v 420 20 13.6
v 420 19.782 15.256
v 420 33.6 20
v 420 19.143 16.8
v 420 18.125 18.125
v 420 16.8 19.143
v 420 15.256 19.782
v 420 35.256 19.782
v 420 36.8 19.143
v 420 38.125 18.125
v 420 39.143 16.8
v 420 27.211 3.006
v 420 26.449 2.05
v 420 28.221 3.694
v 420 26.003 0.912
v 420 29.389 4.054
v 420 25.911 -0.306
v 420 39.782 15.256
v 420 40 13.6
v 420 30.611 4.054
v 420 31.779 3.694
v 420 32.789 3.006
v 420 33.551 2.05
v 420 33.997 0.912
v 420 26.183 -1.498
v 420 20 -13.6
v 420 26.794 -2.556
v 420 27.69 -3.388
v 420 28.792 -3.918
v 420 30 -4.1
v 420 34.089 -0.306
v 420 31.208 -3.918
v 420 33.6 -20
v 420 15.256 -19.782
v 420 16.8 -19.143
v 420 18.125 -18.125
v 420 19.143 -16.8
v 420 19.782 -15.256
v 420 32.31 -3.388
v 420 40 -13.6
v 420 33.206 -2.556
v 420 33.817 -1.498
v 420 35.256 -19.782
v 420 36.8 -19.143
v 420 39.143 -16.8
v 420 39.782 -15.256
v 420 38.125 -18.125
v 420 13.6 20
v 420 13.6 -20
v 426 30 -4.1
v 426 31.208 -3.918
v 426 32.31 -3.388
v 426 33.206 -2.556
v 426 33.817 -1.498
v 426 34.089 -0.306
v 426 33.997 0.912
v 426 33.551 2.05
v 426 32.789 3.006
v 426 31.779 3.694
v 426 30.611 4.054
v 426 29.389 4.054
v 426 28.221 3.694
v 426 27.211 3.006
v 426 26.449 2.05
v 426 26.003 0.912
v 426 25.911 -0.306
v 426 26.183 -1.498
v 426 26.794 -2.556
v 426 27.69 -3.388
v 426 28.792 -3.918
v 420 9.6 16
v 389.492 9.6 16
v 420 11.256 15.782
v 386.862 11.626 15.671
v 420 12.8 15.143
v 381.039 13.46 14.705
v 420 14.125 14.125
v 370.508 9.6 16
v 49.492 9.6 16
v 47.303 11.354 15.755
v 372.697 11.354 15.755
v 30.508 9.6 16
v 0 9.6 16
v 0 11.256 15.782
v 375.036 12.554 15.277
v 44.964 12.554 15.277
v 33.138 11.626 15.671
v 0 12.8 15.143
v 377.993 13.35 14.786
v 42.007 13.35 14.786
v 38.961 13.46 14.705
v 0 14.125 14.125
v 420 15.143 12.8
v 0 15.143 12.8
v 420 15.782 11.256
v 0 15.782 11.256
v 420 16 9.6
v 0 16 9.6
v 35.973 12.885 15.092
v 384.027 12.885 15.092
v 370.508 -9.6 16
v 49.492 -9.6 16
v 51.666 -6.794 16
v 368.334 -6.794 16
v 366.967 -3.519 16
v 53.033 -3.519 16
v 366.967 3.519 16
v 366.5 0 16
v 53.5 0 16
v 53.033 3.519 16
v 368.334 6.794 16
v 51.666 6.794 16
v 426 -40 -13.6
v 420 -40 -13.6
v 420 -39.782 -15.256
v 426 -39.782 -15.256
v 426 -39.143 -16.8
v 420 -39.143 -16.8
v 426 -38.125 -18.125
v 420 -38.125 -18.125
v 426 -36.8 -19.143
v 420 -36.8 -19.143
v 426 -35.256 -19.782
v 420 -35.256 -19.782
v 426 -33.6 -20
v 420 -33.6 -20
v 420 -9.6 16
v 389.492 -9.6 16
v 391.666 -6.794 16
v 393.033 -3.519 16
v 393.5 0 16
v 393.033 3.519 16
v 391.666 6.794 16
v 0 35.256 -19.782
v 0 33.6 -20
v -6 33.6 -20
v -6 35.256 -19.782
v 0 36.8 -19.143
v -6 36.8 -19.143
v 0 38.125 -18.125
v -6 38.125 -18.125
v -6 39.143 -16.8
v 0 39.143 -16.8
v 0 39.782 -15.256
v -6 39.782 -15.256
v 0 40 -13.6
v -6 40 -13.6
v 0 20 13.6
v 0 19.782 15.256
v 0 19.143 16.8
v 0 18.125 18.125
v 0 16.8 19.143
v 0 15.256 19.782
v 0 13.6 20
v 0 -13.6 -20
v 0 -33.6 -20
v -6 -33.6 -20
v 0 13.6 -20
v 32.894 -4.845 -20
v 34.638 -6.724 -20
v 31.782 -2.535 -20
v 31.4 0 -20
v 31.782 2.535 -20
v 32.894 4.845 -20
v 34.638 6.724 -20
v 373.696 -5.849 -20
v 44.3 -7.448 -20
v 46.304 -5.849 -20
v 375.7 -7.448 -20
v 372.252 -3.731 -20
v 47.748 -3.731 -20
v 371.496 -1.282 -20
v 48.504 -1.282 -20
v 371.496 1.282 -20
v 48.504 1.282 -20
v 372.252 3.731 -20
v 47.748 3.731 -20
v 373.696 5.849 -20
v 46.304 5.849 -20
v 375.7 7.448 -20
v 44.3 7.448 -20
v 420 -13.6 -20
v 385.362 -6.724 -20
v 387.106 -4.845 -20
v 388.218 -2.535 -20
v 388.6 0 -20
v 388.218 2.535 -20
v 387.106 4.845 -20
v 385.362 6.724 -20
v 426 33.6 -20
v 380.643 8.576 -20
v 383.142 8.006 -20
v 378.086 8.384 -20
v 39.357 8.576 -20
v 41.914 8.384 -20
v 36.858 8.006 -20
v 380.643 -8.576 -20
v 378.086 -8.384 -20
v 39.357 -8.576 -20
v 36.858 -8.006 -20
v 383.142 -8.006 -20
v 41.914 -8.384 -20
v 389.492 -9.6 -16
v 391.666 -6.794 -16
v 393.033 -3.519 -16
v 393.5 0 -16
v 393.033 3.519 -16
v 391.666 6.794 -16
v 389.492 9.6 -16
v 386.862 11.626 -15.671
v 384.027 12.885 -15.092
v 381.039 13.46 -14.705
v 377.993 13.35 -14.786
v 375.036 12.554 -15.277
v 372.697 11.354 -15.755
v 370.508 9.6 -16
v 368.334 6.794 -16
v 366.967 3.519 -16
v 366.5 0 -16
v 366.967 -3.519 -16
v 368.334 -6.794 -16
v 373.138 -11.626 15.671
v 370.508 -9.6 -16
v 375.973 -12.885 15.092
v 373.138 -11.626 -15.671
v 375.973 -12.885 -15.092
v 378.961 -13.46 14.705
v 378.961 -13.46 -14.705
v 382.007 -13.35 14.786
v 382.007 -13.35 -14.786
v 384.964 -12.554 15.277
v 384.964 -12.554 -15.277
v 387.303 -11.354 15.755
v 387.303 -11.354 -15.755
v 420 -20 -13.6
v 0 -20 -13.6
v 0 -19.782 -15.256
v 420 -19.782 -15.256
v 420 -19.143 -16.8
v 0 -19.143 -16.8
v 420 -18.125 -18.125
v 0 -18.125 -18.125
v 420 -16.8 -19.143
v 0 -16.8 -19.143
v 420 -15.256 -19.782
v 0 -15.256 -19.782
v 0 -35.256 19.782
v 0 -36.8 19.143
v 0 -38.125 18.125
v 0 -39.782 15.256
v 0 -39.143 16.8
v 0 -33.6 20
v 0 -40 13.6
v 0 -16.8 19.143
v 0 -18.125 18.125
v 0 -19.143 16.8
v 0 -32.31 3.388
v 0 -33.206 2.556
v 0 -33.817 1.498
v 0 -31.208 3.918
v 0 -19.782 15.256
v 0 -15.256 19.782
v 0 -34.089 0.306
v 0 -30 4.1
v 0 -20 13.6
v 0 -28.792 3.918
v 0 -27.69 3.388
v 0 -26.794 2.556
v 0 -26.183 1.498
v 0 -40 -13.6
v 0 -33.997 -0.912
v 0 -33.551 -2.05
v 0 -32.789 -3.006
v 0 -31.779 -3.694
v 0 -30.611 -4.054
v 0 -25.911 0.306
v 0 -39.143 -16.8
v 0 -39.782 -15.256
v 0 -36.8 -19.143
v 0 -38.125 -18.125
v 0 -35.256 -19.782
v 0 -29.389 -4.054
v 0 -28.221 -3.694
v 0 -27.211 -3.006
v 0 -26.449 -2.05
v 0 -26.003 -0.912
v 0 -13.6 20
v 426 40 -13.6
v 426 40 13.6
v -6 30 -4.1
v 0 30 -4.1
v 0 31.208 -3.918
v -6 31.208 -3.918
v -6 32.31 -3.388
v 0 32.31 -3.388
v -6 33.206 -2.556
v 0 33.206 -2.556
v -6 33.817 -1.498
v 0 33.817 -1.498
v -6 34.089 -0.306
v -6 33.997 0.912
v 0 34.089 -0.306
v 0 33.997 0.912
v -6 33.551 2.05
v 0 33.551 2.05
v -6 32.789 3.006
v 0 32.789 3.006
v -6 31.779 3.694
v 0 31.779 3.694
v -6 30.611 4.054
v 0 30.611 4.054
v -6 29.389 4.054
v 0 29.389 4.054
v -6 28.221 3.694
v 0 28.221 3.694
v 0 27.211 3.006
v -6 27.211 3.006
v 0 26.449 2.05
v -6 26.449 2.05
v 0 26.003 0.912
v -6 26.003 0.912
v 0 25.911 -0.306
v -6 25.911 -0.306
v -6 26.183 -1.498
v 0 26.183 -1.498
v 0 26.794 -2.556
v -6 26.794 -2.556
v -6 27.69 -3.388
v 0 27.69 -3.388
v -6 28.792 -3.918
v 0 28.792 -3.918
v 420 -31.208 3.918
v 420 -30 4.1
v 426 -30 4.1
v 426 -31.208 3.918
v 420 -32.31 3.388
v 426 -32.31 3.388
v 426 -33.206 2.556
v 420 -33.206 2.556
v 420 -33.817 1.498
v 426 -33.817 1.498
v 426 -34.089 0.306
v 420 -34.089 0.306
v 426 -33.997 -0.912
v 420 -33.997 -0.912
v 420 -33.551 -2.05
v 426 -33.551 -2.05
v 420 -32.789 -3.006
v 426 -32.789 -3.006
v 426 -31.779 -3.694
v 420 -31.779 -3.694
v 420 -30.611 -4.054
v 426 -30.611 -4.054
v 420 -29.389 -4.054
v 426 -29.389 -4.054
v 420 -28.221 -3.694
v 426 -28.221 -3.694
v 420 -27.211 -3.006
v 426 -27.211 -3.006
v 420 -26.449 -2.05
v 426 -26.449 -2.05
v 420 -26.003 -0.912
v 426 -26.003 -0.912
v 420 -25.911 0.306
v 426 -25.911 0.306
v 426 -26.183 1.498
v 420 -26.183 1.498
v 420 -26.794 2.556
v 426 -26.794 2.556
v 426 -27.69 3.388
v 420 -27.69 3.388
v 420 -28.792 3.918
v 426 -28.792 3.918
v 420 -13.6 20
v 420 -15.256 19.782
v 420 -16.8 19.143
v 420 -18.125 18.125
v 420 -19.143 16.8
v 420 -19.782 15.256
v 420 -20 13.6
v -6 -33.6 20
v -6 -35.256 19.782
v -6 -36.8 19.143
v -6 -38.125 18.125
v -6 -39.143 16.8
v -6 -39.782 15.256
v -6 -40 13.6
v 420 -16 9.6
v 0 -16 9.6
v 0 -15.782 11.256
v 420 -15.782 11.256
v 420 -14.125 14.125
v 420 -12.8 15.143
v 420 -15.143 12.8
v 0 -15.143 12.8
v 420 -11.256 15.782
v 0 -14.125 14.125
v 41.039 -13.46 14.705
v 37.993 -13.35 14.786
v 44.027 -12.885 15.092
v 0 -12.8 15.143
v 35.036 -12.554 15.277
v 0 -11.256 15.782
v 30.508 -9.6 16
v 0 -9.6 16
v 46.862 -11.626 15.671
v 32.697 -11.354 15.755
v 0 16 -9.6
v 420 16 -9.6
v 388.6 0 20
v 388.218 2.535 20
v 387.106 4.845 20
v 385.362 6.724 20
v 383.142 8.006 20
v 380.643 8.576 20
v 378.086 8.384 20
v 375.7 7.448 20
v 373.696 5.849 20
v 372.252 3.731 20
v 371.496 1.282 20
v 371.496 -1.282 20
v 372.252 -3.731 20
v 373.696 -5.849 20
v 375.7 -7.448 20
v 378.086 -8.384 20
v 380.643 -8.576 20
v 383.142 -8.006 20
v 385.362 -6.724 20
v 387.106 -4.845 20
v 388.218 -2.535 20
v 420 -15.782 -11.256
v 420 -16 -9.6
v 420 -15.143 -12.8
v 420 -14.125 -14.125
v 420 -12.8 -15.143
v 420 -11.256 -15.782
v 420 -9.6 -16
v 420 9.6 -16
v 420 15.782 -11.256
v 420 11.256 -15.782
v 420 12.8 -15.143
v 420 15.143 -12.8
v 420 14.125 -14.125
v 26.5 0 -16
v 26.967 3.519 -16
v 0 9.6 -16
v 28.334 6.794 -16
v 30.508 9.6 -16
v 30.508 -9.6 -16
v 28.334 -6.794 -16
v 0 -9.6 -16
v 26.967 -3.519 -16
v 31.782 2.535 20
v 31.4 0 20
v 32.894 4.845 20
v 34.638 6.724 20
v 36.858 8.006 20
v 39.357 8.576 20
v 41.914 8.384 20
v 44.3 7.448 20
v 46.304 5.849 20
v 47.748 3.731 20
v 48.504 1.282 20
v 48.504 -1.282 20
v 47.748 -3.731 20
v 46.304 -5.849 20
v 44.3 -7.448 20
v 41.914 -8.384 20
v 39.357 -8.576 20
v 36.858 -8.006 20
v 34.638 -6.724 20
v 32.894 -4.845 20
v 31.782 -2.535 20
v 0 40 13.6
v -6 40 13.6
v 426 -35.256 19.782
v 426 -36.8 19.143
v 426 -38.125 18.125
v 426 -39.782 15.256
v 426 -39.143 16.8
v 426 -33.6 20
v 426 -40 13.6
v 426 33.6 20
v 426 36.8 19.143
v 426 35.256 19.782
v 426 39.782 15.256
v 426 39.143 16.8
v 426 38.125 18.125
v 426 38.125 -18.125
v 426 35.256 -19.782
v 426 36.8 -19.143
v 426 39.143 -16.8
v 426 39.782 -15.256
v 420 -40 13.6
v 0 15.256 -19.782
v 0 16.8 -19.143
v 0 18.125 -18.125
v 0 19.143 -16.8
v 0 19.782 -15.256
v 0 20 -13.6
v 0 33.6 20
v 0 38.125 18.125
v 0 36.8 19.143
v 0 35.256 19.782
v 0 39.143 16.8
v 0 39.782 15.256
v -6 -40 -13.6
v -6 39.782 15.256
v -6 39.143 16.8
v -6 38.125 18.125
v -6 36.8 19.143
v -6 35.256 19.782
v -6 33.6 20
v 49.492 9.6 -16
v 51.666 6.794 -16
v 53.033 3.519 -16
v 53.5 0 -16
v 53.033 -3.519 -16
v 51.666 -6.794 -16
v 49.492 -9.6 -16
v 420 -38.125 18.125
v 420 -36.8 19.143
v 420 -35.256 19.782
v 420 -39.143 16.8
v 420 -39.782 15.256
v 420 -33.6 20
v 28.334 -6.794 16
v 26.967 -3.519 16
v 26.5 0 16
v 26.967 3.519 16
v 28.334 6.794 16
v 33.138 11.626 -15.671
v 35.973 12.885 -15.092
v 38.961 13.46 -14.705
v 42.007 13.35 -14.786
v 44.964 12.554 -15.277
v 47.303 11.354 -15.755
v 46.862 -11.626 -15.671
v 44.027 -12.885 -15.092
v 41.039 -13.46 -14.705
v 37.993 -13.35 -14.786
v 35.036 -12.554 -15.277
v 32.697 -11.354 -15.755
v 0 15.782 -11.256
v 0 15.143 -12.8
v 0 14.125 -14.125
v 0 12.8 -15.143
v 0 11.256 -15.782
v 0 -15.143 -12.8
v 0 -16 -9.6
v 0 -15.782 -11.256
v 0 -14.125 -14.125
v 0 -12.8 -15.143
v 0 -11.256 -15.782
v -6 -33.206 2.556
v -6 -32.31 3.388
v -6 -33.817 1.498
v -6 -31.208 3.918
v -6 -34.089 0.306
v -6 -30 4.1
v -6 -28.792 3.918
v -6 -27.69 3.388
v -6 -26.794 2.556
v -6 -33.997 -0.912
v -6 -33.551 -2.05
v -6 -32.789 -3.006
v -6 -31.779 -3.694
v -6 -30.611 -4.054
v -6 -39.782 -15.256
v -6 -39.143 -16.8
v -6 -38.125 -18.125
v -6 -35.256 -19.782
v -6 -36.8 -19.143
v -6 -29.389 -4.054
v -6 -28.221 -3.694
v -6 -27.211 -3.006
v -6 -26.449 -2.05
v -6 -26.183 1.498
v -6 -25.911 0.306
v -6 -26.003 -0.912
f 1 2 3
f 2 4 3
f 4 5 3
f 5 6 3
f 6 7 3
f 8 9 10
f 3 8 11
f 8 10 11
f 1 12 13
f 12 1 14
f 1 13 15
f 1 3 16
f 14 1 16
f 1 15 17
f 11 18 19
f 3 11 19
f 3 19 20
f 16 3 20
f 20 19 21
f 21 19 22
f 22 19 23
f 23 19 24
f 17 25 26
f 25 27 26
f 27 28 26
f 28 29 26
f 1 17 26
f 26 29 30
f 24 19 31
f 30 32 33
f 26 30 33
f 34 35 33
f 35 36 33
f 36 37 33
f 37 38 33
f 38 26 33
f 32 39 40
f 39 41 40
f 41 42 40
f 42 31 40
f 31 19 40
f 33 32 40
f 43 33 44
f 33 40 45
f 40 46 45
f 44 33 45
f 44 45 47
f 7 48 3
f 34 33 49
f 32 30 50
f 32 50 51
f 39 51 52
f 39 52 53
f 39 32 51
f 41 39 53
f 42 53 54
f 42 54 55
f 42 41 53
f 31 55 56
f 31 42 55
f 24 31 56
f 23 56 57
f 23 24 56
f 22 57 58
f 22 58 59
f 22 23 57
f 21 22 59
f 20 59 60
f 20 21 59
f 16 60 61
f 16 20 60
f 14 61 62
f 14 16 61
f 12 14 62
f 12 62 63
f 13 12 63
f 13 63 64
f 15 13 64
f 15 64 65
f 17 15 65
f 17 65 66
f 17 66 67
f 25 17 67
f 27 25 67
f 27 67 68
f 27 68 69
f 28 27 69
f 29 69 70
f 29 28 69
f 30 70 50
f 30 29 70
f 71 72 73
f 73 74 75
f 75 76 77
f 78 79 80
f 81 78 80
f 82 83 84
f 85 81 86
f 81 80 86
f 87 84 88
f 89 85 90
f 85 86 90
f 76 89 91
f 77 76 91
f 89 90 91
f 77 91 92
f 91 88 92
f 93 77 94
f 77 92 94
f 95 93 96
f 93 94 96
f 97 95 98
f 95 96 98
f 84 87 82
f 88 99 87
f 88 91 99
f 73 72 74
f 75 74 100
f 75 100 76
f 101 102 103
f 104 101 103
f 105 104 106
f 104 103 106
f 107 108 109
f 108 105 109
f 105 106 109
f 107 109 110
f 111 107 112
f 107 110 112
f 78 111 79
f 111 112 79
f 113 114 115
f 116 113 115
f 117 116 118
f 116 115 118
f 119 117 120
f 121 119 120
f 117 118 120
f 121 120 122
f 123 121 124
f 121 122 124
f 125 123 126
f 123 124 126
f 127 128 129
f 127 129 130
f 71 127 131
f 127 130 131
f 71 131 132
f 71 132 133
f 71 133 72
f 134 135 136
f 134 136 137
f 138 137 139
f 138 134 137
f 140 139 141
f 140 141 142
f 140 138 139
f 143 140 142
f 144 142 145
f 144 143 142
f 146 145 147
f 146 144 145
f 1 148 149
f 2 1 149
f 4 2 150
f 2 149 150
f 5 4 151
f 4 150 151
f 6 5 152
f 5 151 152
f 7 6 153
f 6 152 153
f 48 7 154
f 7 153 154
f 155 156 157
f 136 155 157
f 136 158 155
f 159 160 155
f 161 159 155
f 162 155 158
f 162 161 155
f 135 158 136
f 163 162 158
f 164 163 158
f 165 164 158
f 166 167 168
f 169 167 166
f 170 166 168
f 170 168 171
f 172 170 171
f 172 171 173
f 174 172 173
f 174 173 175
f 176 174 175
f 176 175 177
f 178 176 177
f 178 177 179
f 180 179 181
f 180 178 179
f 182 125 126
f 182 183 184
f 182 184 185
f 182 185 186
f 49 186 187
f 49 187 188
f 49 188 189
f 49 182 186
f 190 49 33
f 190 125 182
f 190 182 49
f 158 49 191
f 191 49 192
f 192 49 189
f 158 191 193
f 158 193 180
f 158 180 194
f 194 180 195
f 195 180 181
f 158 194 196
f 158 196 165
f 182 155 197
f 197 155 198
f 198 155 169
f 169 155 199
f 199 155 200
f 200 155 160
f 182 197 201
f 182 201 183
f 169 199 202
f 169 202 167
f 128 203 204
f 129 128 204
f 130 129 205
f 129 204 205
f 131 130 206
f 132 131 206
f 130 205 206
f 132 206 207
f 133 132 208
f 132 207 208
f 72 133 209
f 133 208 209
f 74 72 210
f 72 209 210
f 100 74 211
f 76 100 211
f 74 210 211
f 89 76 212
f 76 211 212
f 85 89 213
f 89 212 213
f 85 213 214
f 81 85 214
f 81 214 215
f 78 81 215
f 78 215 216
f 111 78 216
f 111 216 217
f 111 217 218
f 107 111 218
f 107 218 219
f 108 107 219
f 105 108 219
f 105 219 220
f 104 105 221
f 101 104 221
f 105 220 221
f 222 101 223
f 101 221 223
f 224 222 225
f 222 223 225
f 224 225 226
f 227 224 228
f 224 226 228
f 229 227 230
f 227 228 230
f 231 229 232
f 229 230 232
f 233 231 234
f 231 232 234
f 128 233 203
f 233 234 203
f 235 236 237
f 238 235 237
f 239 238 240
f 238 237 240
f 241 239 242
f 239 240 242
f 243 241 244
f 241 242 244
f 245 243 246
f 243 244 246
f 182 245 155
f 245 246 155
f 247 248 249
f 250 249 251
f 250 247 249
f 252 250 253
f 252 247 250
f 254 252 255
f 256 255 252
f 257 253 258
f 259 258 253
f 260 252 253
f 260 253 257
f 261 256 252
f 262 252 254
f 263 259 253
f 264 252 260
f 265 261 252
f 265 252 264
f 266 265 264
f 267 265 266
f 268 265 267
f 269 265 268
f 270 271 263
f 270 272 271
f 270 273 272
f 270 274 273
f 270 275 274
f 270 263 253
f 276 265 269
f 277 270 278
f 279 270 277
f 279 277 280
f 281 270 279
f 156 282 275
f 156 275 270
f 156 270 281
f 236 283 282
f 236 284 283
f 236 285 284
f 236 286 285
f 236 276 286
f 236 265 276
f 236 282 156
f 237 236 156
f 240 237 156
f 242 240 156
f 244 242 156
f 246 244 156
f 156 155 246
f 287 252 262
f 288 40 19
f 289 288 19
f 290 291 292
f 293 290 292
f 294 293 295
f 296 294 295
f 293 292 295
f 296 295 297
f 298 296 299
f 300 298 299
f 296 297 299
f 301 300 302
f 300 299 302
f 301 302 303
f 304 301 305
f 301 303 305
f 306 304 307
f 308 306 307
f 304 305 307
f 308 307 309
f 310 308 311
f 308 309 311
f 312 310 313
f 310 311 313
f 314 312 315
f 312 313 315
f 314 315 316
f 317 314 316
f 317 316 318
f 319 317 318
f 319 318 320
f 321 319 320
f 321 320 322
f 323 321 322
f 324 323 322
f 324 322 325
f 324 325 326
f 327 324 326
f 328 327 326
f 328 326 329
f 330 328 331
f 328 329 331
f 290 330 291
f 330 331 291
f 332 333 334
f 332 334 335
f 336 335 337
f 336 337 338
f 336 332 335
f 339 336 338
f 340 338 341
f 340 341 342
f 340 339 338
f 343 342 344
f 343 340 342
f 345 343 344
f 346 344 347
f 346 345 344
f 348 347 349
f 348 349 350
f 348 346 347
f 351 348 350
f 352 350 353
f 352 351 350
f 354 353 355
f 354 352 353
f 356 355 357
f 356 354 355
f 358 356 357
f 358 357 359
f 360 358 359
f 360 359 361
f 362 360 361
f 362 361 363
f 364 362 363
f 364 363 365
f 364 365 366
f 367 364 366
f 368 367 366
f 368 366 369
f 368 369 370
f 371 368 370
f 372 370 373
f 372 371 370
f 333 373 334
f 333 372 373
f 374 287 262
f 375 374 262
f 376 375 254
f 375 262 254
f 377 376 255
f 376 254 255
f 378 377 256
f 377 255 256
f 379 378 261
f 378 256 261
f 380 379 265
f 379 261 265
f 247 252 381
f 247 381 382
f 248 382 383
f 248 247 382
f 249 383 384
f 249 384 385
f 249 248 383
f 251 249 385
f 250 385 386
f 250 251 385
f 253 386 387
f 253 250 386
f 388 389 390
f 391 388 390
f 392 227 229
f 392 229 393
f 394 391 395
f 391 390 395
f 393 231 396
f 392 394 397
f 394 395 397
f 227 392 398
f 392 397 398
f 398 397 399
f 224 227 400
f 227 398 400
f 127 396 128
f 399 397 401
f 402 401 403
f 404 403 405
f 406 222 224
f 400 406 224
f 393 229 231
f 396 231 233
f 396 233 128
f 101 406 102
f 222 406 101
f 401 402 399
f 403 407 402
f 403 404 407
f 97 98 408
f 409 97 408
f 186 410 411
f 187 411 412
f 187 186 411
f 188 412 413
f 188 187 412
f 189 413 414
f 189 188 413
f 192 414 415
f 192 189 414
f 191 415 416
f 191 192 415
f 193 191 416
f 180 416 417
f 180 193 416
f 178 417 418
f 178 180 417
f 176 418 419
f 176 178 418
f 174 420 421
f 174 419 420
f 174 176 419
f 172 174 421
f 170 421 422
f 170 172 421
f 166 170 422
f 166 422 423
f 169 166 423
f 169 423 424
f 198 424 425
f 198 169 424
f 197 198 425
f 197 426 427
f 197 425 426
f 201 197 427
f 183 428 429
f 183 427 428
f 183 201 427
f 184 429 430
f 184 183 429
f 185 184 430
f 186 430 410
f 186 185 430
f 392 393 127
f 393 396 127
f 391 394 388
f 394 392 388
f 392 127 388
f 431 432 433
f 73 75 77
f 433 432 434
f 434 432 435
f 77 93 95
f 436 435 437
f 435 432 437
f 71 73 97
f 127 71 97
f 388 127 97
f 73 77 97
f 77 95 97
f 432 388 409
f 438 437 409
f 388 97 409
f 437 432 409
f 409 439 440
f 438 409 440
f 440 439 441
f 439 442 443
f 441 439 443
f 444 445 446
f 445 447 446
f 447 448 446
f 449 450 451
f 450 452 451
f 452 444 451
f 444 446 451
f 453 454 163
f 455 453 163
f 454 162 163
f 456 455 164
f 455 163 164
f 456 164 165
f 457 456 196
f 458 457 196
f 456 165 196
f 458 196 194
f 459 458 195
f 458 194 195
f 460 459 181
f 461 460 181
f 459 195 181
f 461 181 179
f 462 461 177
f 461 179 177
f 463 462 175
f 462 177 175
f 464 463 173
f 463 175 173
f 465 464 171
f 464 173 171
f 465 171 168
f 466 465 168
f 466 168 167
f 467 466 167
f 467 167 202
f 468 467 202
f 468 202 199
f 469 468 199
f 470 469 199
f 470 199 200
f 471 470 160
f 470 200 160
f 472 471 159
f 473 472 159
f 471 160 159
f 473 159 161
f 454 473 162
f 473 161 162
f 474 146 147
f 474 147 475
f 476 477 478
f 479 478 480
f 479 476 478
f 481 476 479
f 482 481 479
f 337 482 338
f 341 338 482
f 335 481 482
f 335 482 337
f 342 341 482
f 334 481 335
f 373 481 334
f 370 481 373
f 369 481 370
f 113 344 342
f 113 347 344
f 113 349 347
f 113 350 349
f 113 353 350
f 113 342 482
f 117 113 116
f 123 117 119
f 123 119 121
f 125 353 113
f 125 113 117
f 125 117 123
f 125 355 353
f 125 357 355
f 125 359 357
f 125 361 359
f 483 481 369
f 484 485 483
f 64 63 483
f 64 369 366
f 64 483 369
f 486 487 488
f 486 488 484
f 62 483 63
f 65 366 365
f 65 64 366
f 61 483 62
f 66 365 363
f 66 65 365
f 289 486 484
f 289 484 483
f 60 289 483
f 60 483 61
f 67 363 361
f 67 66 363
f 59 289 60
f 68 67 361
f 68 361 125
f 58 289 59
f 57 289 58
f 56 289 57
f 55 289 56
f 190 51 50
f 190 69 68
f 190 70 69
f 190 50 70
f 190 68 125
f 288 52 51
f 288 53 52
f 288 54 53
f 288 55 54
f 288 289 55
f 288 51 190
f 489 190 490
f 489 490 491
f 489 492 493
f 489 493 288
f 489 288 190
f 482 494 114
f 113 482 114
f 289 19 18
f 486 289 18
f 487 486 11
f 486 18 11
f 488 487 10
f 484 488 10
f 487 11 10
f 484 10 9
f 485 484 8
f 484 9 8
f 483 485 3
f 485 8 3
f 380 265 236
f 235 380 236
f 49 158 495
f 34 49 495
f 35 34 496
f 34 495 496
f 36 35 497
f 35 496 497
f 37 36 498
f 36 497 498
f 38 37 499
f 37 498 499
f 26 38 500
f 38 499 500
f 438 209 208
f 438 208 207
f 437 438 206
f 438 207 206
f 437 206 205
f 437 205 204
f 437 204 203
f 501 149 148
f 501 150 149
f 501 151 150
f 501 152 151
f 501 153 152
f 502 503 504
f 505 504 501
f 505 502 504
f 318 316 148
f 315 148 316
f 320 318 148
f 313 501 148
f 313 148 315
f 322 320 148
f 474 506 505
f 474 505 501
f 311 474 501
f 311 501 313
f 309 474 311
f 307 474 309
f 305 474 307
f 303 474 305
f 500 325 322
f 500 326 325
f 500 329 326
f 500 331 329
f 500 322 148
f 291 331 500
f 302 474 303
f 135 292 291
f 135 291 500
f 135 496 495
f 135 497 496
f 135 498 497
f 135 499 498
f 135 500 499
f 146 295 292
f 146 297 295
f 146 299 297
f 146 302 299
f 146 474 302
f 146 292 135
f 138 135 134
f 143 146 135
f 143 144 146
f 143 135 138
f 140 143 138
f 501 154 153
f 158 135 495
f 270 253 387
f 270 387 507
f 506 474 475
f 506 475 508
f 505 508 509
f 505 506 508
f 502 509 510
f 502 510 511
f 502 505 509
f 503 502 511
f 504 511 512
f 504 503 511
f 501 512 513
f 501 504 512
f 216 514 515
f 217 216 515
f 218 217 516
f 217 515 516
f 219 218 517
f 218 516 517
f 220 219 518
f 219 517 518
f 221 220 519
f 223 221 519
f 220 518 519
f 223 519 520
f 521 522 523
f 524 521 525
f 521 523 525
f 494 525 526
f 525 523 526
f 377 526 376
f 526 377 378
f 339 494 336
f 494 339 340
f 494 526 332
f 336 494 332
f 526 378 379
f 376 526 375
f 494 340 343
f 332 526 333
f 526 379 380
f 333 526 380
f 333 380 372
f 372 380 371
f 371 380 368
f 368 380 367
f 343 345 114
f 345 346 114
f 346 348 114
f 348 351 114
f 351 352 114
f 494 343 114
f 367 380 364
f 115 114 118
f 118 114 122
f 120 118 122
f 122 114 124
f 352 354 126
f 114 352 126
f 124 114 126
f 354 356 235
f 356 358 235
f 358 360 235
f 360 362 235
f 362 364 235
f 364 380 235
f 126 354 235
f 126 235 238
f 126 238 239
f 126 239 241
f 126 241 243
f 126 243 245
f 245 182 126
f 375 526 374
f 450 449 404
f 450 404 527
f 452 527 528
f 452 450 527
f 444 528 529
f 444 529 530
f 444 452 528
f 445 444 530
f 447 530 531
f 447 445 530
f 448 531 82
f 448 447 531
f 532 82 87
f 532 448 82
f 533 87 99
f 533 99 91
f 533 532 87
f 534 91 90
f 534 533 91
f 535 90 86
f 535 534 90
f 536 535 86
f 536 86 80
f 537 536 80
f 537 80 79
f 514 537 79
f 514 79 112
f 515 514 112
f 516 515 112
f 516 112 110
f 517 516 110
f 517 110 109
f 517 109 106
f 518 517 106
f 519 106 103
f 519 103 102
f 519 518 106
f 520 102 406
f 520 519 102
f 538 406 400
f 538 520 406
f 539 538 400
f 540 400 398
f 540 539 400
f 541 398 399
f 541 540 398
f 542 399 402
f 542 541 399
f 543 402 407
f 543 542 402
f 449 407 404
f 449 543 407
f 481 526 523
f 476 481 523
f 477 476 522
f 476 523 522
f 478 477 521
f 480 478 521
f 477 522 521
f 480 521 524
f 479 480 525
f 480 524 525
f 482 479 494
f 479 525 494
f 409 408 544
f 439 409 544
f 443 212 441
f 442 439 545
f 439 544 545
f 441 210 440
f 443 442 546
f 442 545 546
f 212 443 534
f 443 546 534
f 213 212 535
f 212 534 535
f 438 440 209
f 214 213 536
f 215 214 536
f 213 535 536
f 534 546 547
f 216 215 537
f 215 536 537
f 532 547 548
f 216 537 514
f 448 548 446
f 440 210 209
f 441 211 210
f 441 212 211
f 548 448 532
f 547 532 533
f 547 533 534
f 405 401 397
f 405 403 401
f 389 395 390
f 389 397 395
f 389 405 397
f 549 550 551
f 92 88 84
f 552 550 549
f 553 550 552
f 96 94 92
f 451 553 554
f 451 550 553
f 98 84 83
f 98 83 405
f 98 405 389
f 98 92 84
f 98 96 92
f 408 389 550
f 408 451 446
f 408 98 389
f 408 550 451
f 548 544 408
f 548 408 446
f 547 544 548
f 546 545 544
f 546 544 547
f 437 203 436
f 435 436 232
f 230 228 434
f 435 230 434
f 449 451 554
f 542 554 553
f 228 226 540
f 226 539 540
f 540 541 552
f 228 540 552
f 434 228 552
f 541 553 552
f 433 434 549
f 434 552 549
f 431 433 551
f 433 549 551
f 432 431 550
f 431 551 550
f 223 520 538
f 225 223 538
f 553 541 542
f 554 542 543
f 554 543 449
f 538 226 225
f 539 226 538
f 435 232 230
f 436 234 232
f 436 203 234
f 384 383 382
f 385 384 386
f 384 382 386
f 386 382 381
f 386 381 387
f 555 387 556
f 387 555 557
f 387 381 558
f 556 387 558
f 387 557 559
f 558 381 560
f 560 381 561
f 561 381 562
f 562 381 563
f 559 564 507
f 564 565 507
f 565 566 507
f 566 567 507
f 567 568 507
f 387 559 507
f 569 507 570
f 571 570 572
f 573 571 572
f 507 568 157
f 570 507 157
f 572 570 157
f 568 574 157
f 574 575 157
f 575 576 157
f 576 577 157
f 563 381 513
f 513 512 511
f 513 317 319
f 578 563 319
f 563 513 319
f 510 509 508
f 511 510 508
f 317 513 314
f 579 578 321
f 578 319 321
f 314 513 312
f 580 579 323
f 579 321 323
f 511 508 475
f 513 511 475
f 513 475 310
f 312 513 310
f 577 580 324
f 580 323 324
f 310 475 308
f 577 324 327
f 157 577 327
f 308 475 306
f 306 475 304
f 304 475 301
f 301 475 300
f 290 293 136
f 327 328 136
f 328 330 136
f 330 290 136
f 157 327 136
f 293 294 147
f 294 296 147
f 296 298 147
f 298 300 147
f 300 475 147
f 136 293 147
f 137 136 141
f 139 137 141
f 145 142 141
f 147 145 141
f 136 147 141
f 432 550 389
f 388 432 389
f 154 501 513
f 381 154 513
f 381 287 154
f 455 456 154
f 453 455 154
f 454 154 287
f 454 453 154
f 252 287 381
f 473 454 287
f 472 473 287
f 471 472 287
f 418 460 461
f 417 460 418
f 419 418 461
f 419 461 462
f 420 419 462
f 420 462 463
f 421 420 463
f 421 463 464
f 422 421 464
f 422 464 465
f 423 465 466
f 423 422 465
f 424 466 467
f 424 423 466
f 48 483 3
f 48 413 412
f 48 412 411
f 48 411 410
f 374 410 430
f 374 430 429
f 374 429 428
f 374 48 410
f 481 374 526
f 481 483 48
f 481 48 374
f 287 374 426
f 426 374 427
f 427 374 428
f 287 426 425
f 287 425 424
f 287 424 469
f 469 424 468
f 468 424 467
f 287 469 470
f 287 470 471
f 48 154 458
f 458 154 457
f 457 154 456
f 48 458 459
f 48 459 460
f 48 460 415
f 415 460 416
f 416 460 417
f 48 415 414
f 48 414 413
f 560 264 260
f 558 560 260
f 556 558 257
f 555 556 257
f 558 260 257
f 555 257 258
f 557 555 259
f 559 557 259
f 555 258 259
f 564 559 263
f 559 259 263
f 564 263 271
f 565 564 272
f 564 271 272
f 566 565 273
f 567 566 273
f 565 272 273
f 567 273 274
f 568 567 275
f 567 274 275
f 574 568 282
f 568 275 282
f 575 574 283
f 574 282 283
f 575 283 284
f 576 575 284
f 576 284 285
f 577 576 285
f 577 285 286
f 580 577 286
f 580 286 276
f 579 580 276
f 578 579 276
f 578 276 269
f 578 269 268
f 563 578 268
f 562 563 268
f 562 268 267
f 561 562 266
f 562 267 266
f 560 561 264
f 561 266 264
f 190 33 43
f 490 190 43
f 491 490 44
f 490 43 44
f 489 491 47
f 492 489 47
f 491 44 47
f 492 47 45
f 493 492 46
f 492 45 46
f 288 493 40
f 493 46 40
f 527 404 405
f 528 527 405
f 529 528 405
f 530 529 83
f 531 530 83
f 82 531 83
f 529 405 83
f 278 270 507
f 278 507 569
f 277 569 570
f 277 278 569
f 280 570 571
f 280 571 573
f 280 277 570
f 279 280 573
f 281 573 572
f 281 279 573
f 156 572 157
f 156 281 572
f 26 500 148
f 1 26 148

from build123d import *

# Parameters (mm, degrees)
DODANIE_WYCI_GNI_CIE2_DEPTH = 420
SZKIC4_R                    = 4.1
DODANIE_WYCI_GNI_CIE3_DEPTH = 6
SZKIC6_R                    = 8.6
WYTNIJ_WYCI_GNI_CIE1_DEPTH  = 430.73945595
DODANIE_WYCI_GNI_CIE5_REACH = 431.739
SZKIC6_3_R                  = 13.5
SZKIC6_3_R_2                = 8.6


with BuildPart() as part:
    # Szkic3 → Dodanie-wyciągnięcie2 (new body)
    with BuildSketch(Plane(origin=(0, 0, 0), x_dir=(0, 0, -1), z_dir=(1, 0, 0))):
        with BuildLine():
            Line((-13.6, -20), (13.6, -20))
            ThreePointArc((13.6, -20), (18.1254834, -18.1254834), (20, -13.6))
            Line((20, -13.6), (20, 13.6))
            ThreePointArc((20, 13.6), (18.1254834, 18.1254834), (13.6, 20))
            Line((13.6, 20), (-13.6, 20))
            ThreePointArc((-13.6, 20), (-18.1254834, 18.1254834), (-20, 13.6))
            Line((-20, 13.6), (-20, -13.6))
            ThreePointArc((-20, -13.6), (-18.1254834, -18.1254834), (-13.6, -20))
        make_face()
        with BuildLine():
            Line((-9.6, 16), (9.6, 16))
            ThreePointArc((9.6, 16), (14.1254834, 14.1254834), (16, 9.6))
            Line((16, 9.6), (16, -9.6))
            ThreePointArc((16, -9.6), (14.1254834, -14.1254834), (9.6, -16))
            Line((9.6, -16), (-9.6, -16))
            ThreePointArc((-9.6, -16), (-14.1254834, -14.1254834), (-16, -9.6))
            Line((-16, -9.6), (-16, 9.6))
            ThreePointArc((-16, 9.6), (-14.1254834, 14.1254834), (-9.6, 16))
        make_face(mode=Mode.SUBTRACT)
    extrude(amount=DODANIE_WYCI_GNI_CIE2_DEPTH)

    # Szkic4 → Dodanie-wyciągnięcie3 (add)
    with BuildSketch(Plane(origin=(420, 0, 0), x_dir=(0, 0, -1), z_dir=(1, 0, 0))):
        with BuildLine():
            Line((-13.6, -40), (13.6, -40))
            ThreePointArc((13.6, -40), (18.1254834, -38.1254834), (20, -33.6))
            Line((20, -33.6), (20, 33.6))
            ThreePointArc((20, 33.6), (18.1254834, 38.1254834), (13.6, 40))
            Line((13.6, 40), (-13.6, 40))
            ThreePointArc((-13.6, 40), (-18.1254834, 38.1254834), (-20, 33.6))
            Line((-20, 33.6), (-20, -33.6))
            ThreePointArc((-20, -33.6), (-18.1254834, -38.1254834), (-13.6, -40))
        make_face()
        with Locations((0, 30)):
            Circle(SZKIC4_R, mode=Mode.SUBTRACT)
        with Locations((0, -30)):
            Circle(SZKIC4_R, mode=Mode.SUBTRACT)
    dodanie_wyci_gni_cie3 = extrude(amount=DODANIE_WYCI_GNI_CIE3_DEPTH)

    # Lustro4: Dodanie-wyciągnięcie3 across plane
    add(dodanie_wyci_gni_cie3.mirror(Plane(origin=(210, 0, 0), x_dir=(0, 0, 1), z_dir=(1, 0, 0))))

    # Szkic6 → Wytnij-wyciągnięcie1 (cut, through all)
    with BuildSketch(Plane(origin=(0, 0, -20), x_dir=(-1, 0, 0), z_dir=(0, 0, -1))):
        with Locations((-40, 0)):
            Circle(SZKIC6_R)
    wytnij_wyci_gni_cie1 = extrude(amount=-WYTNIJ_WYCI_GNI_CIE1_DEPTH, mode=Mode.SUBTRACT)

    # Szkic6<3> → Dodanie-wyciągnięcie5 (add, up to next)
    with BuildSketch(Plane(origin=(0, 0, -20), x_dir=(-1, 0, 0), z_dir=(0, 0, -1)), mode=Mode.PRIVATE) as dodanie_wyci_gni_cie5_sk1:
        with Locations((-40, 0)):
            Circle(SZKIC6_3_R)
        with Locations((-40, 0)):
            Circle(SZKIC6_3_R_2, mode=Mode.SUBTRACT)
    dodanie_wyci_gni_cie5_tool1 = extrude(dodanie_wyci_gni_cie5_sk1.sketch, amount=-DODANIE_WYCI_GNI_CIE5_REACH, mode=Mode.PRIVATE) - part.part
    dodanie_wyci_gni_cie5 = dodanie_wyci_gni_cie5_tool1.solids().sort_by_distance((53.118162, 0, -20))[0]
    add(dodanie_wyci_gni_cie5)

    # Lustro6: Wytnij-wyciągnięcie1, Dodanie-wyciągnięcie5 across plane
    add(wytnij_wyci_gni_cie1.mirror(Plane(origin=(210, 0, 0), x_dir=(0, 0, 1), z_dir=(1, 0, 0))), mode=Mode.SUBTRACT)
    add(dodanie_wyci_gni_cie5.mirror(Plane(origin=(210, 0, 0), x_dir=(0, 0, 1), z_dir=(1, 0, 0))))


solid = part.part
